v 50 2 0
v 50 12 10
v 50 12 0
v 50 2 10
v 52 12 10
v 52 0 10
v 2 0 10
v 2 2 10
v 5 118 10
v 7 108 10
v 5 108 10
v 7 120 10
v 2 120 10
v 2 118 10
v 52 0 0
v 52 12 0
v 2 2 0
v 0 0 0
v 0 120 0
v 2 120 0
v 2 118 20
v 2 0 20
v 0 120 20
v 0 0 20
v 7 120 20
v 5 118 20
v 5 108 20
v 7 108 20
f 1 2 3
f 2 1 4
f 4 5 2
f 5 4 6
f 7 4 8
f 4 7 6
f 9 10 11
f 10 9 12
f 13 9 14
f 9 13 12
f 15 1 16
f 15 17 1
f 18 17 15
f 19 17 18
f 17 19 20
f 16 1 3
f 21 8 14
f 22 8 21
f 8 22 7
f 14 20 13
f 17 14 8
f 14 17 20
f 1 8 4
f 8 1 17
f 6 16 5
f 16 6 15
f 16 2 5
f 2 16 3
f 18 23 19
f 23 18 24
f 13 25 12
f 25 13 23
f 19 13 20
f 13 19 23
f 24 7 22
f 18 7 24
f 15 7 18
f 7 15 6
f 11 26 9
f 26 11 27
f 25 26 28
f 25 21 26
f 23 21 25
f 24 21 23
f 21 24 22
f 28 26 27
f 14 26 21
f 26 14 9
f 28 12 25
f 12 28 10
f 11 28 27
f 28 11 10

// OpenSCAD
dishwasher_door_depth = 48;
dishwasher_door_inner_gap = 2;
dishwasher_door_inner_gap_height = 10;
dishwasher_door_upper_gap = 2;

diswasher_cover_depth = 3;

outside_wall_thickness = 2;
outside_wall_height = 120;

width = 10;
bottom_overhang_offset = 10;

// Model the dishwasher "door" so we can substract it from the model
module door(depth) {
    union() {
        cube([depth, outside_wall_height, width]);
        magic_offset_number = 2;
        translate([magic_offset_number, dishwasher_door_inner_gap_height, 0])
            cube([depth, outside_wall_height, width]);

    }
};

// We are going to use this for both the top and bottom overhang
module overhang(depth) {
    difference() {
        cube([
            outside_wall_thickness + depth + dishwasher_door_upper_gap,
            outside_wall_height,
            width
        ]);
        translate([outside_wall_thickness, dishwasher_door_upper_gap, 0])
            door(depth);
    }
}

// Overhang that goes over the top of the door and to the inside gap
module top_overhang() {
    overhang(dishwasher_door_depth);
}

module bottom_overhang() {
    mirror([0, 1, 0])
    translate([0,-outside_wall_height,bottom_overhang_offset])
        overhang(diswasher_cover_depth);
}

top_overhang();
bottom_overhang();
